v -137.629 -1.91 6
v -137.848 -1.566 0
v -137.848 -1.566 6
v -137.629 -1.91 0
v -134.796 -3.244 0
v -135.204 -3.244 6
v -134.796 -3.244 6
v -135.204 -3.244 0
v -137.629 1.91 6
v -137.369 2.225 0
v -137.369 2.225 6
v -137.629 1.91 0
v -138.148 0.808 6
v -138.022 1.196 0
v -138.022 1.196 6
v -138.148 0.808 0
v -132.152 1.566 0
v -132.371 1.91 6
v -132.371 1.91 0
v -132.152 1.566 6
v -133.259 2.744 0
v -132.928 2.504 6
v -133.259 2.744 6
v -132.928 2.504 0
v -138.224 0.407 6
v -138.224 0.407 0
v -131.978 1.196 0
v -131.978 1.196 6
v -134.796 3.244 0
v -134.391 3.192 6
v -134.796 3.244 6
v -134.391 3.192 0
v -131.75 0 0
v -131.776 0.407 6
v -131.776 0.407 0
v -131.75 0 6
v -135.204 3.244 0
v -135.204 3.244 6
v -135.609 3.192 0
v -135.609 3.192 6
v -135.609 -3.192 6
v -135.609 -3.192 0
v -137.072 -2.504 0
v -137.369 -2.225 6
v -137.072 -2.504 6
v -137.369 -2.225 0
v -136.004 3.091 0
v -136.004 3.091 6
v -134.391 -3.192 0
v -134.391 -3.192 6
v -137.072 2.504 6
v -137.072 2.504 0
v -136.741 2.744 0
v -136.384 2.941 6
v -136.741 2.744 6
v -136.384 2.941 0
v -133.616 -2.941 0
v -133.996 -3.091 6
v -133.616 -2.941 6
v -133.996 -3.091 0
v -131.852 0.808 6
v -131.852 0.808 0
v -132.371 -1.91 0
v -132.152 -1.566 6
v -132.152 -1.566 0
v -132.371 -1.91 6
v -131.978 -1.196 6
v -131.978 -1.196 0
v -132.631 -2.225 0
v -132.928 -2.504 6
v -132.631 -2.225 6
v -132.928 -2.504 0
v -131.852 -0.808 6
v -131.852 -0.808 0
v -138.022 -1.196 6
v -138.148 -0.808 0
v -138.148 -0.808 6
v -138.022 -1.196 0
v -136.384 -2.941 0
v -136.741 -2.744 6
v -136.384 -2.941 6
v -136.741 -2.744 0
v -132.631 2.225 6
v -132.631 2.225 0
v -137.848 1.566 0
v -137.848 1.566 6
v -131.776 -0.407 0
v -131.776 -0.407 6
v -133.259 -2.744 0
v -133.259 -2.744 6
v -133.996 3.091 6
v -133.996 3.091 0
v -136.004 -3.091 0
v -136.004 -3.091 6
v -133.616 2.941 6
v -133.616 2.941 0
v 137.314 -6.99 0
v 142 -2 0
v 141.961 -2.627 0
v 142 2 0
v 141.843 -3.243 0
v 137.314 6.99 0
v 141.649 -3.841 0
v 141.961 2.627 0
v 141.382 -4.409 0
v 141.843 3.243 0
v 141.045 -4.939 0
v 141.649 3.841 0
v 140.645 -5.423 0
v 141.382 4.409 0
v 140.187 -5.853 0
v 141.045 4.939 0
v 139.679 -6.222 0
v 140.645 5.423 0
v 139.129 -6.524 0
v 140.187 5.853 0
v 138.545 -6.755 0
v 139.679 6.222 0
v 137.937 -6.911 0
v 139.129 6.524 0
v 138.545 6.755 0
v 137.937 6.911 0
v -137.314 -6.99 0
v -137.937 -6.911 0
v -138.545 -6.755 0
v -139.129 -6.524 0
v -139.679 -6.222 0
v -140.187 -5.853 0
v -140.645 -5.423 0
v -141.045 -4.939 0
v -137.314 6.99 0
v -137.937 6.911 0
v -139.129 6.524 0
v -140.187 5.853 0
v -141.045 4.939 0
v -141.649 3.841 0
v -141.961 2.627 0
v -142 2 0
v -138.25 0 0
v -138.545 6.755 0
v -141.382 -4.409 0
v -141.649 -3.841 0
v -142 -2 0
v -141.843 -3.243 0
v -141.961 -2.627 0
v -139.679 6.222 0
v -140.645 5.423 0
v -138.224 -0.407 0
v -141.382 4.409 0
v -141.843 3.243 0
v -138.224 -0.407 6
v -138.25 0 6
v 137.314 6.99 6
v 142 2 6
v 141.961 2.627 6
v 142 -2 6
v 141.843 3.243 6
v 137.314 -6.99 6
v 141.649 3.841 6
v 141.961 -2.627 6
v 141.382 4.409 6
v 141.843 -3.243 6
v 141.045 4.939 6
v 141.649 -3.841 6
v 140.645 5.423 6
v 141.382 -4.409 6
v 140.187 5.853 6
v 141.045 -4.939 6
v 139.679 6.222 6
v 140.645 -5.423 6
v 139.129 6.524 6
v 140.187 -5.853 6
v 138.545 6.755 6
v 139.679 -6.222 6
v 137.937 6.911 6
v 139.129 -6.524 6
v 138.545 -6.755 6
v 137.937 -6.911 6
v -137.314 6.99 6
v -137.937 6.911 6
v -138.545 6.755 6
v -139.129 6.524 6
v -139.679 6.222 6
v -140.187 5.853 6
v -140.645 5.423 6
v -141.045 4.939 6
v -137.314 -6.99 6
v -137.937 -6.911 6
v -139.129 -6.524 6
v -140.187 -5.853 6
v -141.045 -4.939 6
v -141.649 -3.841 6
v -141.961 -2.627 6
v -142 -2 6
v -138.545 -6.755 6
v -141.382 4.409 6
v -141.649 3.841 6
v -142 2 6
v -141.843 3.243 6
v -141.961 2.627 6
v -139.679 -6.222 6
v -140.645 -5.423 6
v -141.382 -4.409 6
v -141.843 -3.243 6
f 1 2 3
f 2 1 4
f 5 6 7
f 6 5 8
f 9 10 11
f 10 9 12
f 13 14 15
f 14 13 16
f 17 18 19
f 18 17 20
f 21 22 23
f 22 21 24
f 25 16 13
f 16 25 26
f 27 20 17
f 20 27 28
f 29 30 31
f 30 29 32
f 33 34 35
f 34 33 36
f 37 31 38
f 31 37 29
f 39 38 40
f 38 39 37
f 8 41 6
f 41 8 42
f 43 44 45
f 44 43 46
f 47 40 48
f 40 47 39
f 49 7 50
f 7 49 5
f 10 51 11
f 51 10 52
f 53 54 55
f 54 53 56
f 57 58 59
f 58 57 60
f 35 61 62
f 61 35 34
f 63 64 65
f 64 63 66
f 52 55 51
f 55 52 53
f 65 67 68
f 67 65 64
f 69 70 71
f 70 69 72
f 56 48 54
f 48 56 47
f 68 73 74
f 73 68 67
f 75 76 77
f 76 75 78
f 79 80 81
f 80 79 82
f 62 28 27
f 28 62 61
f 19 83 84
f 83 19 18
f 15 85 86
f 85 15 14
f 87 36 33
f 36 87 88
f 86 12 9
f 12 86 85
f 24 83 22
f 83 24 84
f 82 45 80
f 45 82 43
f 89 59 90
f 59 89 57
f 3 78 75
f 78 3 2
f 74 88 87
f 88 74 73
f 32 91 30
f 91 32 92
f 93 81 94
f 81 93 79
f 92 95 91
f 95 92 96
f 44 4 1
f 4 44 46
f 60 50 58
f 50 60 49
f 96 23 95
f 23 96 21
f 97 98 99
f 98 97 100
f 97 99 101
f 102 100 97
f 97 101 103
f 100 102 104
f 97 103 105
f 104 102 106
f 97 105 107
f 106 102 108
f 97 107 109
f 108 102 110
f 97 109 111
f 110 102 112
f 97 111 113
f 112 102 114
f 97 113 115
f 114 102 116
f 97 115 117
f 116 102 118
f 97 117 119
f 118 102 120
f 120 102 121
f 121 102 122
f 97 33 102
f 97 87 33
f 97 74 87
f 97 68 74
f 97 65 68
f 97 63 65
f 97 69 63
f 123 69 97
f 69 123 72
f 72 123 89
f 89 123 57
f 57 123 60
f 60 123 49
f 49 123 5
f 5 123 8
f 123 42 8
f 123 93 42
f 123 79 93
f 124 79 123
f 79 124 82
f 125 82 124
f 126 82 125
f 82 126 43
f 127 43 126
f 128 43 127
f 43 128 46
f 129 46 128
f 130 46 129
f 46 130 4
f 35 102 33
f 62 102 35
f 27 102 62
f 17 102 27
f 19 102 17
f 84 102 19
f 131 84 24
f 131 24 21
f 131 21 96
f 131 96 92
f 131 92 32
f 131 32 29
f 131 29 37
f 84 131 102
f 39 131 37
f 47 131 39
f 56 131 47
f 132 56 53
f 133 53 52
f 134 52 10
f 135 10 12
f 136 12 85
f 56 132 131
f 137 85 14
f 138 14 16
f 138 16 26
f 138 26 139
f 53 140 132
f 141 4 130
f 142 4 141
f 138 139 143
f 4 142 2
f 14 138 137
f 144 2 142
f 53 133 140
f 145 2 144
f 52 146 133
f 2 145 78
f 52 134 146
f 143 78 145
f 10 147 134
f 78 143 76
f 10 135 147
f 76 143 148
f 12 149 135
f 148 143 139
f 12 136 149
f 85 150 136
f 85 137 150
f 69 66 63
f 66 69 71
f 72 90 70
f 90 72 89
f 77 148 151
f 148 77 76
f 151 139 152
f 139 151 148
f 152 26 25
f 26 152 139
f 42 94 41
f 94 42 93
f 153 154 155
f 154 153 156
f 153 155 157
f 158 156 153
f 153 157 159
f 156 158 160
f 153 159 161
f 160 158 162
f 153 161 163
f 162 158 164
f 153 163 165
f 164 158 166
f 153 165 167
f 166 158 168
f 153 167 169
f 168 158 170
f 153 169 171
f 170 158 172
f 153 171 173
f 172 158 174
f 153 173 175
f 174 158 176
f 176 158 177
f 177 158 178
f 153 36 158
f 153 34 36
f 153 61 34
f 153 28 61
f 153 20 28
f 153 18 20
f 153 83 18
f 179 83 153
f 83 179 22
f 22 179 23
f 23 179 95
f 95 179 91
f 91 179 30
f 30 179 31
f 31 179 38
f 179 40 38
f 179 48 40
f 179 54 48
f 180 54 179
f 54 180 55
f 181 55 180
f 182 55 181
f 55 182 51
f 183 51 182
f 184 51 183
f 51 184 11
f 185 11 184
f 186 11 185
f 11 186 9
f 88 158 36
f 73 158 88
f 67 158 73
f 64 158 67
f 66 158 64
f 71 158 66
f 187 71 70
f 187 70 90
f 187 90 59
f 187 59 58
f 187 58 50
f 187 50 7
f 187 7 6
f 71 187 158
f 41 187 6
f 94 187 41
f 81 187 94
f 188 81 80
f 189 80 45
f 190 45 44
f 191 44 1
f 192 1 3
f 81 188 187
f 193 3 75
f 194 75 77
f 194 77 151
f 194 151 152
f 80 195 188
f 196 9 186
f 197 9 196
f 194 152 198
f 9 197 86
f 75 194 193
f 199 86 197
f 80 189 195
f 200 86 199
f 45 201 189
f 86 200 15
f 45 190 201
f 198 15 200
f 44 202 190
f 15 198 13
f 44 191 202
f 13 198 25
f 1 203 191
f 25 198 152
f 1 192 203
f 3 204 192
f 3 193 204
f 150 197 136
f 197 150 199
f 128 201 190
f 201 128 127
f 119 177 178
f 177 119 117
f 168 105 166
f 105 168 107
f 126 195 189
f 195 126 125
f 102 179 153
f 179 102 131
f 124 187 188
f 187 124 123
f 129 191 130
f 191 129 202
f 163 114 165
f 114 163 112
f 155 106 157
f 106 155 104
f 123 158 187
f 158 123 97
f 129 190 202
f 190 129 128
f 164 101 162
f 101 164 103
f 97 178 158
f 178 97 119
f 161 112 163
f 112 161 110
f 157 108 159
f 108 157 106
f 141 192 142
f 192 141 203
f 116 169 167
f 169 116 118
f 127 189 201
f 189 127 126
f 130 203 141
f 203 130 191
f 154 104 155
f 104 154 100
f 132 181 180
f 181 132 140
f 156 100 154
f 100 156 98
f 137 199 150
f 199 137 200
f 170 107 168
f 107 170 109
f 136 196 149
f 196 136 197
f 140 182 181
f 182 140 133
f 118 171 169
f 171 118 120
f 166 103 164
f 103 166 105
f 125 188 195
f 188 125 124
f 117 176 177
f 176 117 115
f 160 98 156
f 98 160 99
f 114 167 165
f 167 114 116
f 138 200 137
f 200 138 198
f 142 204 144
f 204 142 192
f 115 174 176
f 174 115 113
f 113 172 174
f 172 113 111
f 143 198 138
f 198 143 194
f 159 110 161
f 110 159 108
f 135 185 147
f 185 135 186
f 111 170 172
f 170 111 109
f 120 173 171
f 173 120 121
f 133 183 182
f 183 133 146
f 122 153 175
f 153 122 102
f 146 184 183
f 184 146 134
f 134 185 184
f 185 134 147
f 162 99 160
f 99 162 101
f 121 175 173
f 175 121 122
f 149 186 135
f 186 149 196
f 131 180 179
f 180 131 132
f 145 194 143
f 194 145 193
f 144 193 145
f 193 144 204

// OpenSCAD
$fn = 50;


difference() {
	union() {
		hull() {
			translate(v = [-137.0000000000, 2.0000000000, 0]) {
				cylinder(h = 6, r = 5);
			}
			translate(v = [137.0000000000, 2.0000000000, 0]) {
				cylinder(h = 6, r = 5);
			}
			translate(v = [-137.0000000000, -2.0000000000, 0]) {
				cylinder(h = 6, r = 5);
			}
			translate(v = [137.0000000000, -2.0000000000, 0]) {
				cylinder(h = 6, r = 5);
			}
		}
	}
	union() {
		translate(v = [-135.0000000000, 0.0000000000, 0]) {
			cylinder(h = 6, r = 3.2500000000);
		}
		translate(v = [-135.0000000000, 0.0000000000, 0]) {
			cylinder(h = 6, r = 1.8000000000);
		}
		translate(v = [-135.0000000000, 0.0000000000, 0]) {
			cylinder(h = 6, r = 1.8000000000);
		}
		translate(v = [-135.0000000000, 0.0000000000, 0]) {
			cylinder(h = 6, r = 1.8000000000);
		}
	}
}
